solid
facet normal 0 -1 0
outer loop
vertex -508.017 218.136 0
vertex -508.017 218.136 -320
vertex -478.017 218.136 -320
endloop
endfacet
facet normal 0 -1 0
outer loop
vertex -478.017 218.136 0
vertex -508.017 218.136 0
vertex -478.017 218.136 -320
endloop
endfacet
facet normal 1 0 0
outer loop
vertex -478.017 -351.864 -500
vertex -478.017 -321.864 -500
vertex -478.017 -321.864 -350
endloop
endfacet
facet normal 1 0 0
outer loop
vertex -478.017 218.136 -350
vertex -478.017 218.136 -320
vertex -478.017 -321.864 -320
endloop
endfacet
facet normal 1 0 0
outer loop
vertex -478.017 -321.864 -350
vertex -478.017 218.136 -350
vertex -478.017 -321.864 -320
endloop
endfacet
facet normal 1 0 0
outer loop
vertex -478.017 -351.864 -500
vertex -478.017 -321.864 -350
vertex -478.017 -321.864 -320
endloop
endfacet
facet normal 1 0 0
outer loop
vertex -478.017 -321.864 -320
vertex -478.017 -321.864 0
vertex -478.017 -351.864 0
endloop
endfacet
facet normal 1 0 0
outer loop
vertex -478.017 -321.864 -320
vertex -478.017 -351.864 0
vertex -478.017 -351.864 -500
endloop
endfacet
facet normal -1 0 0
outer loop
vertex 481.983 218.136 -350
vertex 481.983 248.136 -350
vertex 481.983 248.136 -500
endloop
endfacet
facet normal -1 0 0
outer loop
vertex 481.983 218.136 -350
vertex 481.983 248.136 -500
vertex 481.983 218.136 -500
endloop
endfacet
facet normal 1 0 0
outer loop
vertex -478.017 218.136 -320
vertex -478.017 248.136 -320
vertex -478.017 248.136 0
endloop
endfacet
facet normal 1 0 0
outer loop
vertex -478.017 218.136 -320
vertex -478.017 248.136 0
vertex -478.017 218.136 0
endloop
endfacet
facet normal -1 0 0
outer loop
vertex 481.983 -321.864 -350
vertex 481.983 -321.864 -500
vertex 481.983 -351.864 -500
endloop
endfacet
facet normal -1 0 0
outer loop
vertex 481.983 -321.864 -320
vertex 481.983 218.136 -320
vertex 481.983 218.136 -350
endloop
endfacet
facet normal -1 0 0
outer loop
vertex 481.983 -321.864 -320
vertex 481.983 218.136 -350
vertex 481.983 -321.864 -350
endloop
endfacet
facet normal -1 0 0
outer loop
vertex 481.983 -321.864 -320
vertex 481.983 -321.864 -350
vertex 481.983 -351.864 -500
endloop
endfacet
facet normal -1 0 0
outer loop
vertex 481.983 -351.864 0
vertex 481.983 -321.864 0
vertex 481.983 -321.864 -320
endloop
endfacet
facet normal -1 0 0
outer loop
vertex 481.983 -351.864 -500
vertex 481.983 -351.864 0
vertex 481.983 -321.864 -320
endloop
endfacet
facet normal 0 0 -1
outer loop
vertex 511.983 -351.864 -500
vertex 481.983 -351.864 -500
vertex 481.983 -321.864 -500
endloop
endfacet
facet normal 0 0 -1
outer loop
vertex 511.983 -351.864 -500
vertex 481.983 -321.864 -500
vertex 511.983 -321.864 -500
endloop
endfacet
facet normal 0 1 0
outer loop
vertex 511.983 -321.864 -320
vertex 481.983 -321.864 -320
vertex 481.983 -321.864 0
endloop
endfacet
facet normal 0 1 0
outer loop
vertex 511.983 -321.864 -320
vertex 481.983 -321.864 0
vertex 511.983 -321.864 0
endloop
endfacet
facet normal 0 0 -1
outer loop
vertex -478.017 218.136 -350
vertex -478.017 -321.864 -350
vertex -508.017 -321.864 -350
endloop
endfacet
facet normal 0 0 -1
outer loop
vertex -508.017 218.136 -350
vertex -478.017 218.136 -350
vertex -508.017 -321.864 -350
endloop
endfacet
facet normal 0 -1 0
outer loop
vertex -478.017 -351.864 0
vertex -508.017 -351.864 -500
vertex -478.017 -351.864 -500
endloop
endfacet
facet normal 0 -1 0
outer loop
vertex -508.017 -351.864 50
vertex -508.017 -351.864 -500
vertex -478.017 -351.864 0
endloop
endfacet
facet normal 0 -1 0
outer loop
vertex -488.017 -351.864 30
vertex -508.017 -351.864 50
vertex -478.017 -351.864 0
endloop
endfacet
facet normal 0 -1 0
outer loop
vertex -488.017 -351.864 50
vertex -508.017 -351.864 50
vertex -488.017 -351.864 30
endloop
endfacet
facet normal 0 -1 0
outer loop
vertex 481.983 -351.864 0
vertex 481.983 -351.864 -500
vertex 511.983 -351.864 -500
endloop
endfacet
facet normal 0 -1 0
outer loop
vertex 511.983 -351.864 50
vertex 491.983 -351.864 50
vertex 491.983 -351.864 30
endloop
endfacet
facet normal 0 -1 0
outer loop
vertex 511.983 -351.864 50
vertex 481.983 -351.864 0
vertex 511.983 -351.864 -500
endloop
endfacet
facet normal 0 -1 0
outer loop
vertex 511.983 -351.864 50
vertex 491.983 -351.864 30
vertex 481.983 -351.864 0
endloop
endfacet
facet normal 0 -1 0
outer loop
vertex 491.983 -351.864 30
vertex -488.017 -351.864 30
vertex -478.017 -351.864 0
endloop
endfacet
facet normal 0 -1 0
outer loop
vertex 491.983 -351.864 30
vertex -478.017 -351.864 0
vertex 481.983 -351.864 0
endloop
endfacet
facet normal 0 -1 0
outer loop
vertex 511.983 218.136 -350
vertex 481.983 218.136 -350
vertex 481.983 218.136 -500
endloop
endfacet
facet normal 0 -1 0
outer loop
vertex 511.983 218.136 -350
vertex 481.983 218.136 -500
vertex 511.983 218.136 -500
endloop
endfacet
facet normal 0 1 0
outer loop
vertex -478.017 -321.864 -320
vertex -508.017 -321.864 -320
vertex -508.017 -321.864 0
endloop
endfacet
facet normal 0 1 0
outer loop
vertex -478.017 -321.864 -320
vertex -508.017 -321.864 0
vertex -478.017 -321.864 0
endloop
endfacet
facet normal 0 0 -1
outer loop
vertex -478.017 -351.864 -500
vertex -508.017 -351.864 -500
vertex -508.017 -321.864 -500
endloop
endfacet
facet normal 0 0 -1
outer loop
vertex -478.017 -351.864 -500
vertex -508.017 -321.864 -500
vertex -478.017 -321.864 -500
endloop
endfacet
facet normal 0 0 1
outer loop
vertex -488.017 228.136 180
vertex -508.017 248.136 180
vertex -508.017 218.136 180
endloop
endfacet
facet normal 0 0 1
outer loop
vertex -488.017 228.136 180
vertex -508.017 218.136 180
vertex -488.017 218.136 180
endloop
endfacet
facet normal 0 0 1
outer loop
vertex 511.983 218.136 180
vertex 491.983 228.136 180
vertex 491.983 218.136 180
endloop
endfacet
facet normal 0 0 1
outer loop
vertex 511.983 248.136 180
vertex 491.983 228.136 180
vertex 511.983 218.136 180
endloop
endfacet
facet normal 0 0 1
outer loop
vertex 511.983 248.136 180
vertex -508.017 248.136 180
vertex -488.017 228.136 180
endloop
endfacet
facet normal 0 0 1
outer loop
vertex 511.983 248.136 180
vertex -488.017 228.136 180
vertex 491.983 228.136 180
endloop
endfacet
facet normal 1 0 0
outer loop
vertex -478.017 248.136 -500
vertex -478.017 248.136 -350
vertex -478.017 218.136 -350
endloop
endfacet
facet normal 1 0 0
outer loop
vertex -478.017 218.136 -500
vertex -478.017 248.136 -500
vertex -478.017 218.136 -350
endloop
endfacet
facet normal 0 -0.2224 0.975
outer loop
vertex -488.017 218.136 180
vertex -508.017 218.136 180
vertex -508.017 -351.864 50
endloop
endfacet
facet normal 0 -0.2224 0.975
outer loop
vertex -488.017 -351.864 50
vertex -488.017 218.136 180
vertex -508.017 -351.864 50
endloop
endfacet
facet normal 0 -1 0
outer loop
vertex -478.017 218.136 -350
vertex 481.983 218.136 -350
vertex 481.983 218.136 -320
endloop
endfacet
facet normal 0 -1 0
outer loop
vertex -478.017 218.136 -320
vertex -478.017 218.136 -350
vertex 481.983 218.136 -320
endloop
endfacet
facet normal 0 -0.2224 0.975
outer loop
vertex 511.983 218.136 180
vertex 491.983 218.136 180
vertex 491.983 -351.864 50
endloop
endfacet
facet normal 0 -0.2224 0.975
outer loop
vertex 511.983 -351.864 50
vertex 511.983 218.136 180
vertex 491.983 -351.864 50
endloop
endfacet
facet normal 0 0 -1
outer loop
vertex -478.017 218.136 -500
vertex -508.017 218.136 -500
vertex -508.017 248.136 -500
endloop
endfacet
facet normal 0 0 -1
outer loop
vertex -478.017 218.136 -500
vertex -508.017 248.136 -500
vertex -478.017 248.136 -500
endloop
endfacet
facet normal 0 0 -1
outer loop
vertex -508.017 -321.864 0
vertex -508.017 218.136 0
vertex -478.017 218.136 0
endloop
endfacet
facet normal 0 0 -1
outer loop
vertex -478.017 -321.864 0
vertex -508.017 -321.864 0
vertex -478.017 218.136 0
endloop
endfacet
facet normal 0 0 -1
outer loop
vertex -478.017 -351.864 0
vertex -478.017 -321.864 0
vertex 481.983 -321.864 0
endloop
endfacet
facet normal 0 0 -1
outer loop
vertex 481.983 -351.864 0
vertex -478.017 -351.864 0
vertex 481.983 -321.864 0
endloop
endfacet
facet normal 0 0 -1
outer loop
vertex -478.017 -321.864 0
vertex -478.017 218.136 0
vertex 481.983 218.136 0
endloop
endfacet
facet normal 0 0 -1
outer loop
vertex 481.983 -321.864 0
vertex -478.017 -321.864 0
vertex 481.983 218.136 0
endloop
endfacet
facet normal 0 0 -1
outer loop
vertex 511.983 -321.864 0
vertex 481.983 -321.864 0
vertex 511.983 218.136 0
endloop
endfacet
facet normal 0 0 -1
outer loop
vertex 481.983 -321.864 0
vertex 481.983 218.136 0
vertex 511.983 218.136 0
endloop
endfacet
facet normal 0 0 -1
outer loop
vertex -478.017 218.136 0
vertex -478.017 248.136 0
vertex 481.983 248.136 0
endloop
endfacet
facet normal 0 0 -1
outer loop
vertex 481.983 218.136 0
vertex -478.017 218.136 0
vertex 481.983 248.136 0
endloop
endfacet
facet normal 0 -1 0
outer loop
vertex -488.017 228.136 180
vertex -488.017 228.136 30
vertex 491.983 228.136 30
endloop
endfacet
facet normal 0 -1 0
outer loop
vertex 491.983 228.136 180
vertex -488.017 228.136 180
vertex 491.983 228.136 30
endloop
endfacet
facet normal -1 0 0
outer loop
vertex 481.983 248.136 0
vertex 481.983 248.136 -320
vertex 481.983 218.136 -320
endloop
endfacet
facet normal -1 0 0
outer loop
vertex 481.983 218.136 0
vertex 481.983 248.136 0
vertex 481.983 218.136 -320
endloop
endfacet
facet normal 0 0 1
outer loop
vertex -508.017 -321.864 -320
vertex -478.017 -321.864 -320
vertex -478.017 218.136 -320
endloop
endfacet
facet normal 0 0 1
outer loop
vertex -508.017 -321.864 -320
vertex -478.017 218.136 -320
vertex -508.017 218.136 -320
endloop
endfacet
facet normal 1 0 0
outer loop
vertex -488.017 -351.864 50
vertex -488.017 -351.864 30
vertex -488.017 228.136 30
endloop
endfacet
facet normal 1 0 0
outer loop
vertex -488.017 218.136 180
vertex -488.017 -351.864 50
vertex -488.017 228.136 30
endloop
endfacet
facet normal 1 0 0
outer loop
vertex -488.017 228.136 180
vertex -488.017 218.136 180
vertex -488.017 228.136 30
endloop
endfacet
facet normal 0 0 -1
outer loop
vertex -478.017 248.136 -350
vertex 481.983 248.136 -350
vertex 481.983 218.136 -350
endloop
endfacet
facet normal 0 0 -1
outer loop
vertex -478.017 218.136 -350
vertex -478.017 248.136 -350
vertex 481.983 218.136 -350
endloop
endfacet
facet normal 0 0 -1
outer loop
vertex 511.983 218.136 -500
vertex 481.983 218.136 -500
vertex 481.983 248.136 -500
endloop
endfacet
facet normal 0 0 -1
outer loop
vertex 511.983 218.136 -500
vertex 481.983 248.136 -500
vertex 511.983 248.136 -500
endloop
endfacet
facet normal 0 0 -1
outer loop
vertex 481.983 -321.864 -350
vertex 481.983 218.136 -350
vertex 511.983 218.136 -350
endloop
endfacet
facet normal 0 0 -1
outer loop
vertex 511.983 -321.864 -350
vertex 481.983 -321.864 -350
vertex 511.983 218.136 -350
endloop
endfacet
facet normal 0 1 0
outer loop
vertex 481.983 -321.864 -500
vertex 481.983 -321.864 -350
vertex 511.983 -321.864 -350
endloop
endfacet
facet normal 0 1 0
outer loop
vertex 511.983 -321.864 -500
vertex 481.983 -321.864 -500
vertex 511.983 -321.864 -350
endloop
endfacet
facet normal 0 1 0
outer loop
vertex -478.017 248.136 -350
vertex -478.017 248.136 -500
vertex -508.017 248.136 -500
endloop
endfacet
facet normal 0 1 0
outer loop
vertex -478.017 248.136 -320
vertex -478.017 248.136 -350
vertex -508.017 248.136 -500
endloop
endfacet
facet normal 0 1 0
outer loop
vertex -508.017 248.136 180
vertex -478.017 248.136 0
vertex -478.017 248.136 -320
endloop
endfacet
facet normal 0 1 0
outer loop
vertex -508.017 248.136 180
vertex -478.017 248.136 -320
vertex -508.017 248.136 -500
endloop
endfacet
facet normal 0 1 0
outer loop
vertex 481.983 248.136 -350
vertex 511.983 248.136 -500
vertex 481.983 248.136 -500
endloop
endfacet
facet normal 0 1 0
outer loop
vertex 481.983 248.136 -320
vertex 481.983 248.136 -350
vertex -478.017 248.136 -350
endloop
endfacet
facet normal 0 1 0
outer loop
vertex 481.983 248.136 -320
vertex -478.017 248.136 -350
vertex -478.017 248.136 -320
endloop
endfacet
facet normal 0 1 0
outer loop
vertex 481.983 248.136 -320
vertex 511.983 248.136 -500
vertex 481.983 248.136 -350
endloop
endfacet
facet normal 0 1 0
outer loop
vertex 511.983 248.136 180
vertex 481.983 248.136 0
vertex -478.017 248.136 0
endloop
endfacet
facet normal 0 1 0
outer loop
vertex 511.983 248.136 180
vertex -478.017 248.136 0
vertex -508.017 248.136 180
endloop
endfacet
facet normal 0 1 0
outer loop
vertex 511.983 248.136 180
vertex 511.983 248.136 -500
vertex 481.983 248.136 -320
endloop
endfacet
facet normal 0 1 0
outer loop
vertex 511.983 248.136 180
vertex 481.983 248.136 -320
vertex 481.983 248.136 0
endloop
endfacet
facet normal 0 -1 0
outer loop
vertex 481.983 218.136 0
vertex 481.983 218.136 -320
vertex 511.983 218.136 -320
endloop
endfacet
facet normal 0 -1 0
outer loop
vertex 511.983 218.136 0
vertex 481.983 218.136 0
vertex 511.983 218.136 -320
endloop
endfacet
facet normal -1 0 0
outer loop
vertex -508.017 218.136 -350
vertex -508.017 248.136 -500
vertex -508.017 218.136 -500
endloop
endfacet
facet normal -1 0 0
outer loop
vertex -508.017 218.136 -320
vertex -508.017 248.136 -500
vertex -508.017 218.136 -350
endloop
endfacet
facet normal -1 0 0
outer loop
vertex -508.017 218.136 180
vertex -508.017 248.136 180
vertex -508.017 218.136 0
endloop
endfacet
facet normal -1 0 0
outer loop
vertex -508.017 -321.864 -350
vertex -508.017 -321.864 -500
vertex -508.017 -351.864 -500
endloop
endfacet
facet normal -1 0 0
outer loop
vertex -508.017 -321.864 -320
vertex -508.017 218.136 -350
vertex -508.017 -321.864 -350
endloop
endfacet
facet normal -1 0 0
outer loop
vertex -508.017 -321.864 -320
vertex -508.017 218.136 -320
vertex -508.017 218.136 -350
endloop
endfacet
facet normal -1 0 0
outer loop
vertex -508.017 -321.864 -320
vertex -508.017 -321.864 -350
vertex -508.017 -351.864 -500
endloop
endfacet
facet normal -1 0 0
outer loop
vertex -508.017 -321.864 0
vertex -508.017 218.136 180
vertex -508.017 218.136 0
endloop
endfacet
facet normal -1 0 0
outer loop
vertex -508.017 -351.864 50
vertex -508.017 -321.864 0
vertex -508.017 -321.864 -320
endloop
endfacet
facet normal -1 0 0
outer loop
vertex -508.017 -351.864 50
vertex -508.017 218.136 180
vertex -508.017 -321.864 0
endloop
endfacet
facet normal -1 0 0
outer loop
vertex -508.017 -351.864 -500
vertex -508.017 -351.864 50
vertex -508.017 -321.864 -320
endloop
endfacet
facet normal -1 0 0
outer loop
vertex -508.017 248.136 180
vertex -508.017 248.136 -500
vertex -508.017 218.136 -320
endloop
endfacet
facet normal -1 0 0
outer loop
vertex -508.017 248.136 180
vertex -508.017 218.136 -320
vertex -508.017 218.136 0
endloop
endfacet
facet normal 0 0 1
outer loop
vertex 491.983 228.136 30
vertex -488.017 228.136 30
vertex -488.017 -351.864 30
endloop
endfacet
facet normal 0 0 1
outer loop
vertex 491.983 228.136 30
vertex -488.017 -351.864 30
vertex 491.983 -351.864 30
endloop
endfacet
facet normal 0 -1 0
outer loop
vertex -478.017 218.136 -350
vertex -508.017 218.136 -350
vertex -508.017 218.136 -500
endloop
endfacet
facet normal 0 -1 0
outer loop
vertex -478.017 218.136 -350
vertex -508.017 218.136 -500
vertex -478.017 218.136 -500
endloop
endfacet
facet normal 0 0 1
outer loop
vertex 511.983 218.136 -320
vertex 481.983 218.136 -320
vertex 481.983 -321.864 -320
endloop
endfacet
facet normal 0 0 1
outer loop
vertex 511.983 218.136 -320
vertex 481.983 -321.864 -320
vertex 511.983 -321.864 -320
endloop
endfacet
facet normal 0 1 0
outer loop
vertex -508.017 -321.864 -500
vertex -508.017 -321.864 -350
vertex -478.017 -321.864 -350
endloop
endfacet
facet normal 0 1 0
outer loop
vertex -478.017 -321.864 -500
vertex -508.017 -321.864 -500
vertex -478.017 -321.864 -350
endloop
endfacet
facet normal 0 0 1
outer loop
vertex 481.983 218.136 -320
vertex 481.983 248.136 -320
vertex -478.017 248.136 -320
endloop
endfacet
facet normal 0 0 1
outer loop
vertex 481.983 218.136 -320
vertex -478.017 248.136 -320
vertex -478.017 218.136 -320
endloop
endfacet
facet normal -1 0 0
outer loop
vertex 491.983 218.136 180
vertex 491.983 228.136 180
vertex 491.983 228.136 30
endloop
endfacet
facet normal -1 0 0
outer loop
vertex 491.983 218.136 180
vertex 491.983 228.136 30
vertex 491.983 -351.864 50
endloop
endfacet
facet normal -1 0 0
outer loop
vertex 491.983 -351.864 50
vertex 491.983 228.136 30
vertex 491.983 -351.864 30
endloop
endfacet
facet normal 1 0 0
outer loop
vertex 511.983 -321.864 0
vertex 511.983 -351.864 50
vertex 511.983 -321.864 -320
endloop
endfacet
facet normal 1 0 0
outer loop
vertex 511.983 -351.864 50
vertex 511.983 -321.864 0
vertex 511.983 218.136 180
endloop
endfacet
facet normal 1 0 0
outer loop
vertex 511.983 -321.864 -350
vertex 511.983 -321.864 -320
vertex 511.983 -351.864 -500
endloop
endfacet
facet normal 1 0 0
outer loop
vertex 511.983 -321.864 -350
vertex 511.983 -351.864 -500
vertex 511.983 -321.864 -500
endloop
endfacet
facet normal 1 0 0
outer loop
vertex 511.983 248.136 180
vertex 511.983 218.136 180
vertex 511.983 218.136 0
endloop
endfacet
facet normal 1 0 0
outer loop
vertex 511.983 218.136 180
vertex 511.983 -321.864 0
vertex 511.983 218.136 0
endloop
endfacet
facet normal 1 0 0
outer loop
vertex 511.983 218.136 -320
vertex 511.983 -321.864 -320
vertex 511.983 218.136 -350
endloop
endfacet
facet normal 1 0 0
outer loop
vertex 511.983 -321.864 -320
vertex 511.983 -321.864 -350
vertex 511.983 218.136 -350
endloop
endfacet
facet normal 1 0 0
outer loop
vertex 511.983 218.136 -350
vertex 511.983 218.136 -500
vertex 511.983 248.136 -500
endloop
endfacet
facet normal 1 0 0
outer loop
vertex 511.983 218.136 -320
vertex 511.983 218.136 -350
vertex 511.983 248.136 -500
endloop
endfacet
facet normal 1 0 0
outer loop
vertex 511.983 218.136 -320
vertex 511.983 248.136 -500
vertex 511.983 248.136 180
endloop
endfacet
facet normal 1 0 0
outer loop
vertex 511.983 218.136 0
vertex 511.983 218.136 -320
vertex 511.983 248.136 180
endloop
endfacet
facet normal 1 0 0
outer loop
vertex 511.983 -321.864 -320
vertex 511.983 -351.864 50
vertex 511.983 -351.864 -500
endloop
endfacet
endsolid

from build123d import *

# Parameters (mm, degrees)
F0_W      = 1020
F0_H      = 600
F1_DEPTH  = 30
F3_DEPTH  = 150
F5_DEPTH  = 2000
F6_W      = 30
F6_H      = 30
F7_DEPTH  = 500
F8_W      = 30
F8_H      = 30
F9_DEPTH  = 540
F10_W     = 30
F10_H     = 30
F11_DEPTH = 540
F12_W     = 30
F12_H     = 30
F13_DEPTH = 960


with BuildPart() as f1:
    # F0 (on Top) → F1 (new body)
    with BuildSketch(Plane.XY):
        with Locations((1.982912, -51.863651)):
            Rectangle(F0_W, F0_H)
    extrude(amount=F1_DEPTH)

    # F2 (on face) → F3 (join)
    with BuildSketch(Plane.XY.offset(30)):
        Polygon((-508.017088, 248.136349), (-508.017088, -351.863651), (-488.017088, -351.863651), (-488.017088, 228.136349), (491.982912, 228.136349), (491.982912, -351.863651), (511.982912, -351.863651), (511.982912, 248.136349), align=None)
    extrude(amount=F3_DEPTH)

    # F4 (on face) → F5 (cut)
    with BuildSketch(Plane(origin=(-508.017088, 0, 0), x_dir=(0, -1, 0), z_dir=(-1, 0, 0))):
        Polygon((351.863651, 180), (-218.136349, 180), (351.863651, 50), align=None)
    extrude(amount=-F5_DEPTH, mode=Mode.SUBTRACT)

    # F6 (on face) → F7 (join)
    with BuildSketch(Plane(origin=(0, 0, 0), x_dir=(1, 0, 0), z_dir=(0, 0, -1))):
        with Locations((-493.017088, 336.863651)):
            Rectangle(F6_W, F6_H)
        with Locations((-493.017088, -233.136349)):
            Rectangle(F6_W, F6_H)
        with Locations((496.982912, 336.863651)):
            Rectangle(F6_W, F6_H)
        with Locations((496.982912, -233.136349)):
            Rectangle(F6_W, F6_H)
    extrude(amount=F7_DEPTH)

    # F8 (on face) → F9 (join, through all)
    with BuildSketch(Plane(origin=(0, -321.863651, 0), x_dir=(-1, 0, 0), z_dir=(0, 1, 0))):
        with Locations((493.017088, -335)):
            Rectangle(F8_W, F8_H)
    extrude(amount=F9_DEPTH)

    # F10 (on face) → F11 (join, through all)
    with BuildSketch(Plane.XZ.offset(-218.136349)):
        with Locations((496.982912, -335)):
            Rectangle(F10_W, F10_H)
    extrude(amount=F11_DEPTH)

    # F12 (on face) → F13 (join, through all)
    with BuildSketch(Plane(origin=(481.982912, 0, 0), x_dir=(0, -1, 0), z_dir=(-1, 0, 0))):
        with Locations((-233.136349, -335)):
            Rectangle(F12_W, F12_H)
    extrude(amount=F13_DEPTH)


solid = f1.part
